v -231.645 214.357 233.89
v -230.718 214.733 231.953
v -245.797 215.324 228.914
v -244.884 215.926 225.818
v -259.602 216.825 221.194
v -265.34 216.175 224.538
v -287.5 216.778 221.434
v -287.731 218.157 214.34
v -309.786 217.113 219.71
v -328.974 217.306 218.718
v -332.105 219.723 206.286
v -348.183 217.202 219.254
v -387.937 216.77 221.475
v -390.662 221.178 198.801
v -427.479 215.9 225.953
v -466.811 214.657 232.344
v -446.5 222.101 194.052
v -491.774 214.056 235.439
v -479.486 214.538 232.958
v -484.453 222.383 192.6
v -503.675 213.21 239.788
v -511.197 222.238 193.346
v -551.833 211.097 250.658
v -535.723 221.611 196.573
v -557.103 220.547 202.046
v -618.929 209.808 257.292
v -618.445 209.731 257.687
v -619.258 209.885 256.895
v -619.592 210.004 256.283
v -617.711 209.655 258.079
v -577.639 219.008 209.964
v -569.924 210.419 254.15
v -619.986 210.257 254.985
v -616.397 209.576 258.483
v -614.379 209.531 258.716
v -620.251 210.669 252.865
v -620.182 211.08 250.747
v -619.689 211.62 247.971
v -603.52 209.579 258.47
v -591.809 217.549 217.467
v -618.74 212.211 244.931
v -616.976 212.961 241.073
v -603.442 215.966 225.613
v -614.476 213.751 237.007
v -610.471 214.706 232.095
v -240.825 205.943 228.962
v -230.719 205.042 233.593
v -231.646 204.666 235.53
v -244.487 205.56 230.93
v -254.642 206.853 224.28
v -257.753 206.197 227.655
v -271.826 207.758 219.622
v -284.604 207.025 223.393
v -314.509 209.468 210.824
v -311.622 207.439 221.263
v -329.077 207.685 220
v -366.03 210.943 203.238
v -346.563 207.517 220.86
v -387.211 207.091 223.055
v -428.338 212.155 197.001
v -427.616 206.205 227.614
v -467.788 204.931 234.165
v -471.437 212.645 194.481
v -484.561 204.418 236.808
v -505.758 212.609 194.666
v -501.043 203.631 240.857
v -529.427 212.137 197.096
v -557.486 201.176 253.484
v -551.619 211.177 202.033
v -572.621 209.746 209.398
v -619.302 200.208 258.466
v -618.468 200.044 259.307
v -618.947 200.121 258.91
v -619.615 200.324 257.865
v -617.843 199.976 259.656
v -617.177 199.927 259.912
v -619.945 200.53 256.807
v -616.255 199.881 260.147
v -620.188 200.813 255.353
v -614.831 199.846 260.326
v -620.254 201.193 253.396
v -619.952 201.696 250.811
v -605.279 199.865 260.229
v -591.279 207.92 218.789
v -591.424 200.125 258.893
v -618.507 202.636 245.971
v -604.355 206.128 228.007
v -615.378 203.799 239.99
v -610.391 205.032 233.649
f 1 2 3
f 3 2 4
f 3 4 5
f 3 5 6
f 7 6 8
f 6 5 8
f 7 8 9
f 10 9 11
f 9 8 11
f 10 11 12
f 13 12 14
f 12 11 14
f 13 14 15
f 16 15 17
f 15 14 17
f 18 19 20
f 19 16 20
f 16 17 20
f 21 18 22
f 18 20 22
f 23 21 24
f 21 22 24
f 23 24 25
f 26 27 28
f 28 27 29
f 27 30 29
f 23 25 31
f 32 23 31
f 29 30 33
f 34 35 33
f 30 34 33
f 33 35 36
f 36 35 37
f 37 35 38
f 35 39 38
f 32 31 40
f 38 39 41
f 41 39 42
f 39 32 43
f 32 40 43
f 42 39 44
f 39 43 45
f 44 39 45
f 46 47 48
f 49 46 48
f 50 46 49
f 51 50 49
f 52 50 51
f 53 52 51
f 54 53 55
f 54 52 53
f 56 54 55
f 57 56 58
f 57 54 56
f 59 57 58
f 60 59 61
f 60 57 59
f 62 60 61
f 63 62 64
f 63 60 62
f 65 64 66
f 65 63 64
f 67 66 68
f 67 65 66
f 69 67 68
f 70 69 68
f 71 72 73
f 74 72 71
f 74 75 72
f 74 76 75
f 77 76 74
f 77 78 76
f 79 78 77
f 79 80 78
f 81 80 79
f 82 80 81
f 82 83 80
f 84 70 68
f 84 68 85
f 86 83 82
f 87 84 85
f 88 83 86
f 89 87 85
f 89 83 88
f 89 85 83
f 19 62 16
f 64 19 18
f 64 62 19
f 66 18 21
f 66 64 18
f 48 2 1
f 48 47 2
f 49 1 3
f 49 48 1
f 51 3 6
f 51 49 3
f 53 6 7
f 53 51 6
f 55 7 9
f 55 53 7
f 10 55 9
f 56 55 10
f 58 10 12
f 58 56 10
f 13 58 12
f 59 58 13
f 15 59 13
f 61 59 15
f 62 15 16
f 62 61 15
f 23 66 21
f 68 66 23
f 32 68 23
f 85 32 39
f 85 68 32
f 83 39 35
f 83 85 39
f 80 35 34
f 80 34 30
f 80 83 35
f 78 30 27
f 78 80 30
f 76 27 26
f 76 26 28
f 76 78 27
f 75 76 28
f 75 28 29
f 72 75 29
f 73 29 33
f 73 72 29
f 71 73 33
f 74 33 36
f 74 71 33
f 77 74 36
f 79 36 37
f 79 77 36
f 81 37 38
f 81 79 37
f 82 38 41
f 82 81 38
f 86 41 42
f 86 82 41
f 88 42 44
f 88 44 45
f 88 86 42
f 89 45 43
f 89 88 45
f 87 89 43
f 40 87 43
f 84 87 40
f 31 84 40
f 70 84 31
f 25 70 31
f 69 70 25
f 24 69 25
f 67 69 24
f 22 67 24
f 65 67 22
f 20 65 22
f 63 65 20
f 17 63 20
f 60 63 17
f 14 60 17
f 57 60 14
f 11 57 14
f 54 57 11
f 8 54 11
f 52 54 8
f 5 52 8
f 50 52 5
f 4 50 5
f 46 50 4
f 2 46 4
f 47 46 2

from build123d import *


with BuildPart() as part:
    # Szkic1 → Wyciągnięcie po profilach1 section 0
    with BuildSketch(Plane(origin=(0, 250.36091718, 48.665232477), x_dir=(1, 0, 0), z_dir=(0, -0.981627183, -0.190808995))):
        with BuildLine():
            Line((-230.718181465, 186.71807225), (-231.645319449, 188.691942525))
            add(Edge.make_bspline(
                [(-231.645319449, 188.691942525), (-233.174644141, 187.999953464), (-234.721783332, 187.364140241), (-237.841249221, 186.171939505), (-239.414020678, 185.616954481), (-244.164400083, 184.053112564), (-247.374501337, 183.146719317), (-253.851623397, 181.51342164), (-257.119855918, 180.780316602), (-263.657686797, 179.453922888), (-266.932791453, 178.860184209), (-276.773612098, 177.252991106), (-283.354734665, 176.412436258), (-296.548078516, 175.080330415), (-303.160298205, 174.588761507), (-309.785788347, 174.246119623)],
                knots=[0, 0, 0, 0, 0.0625, 0.0625, 0.125, 0.125, 0.25, 0.25, 0.375, 0.375, 0.5, 0.5, 0.75, 0.75, 1, 1, 1, 1], degree=3))
            add(Edge.make_bspline(
                [(-348.183016714, 173.781671183), (-328.964171571, 172.456994761), (-309.785788347, 174.246119623)],
                knots=[0, 0, 0, 1, 1, 1], degree=2))
            add(Edge.make_bspline(
                [(-348.183016714, 173.781671183), (-358.151666656, 174.022025786), (-368.096286676, 174.522537173), (-387.94418485, 175.971142244), (-397.847591779, 176.917841756), (-417.618208057, 179.203129122), (-427.484934044, 180.546950038), (-442.260684852, 182.826175434), (-447.183290441, 183.629033837), (-457.009652818, 185.314266402), (-461.914365461, 186.197158818), (-466.811292159, 187.117080937)],
                knots=[0, 0, 0, 0, 0.25, 0.25, 0.5, 0.5, 0.75, 0.75, 0.875, 0.875, 1, 1, 1, 1], degree=3))
            add(Edge.make_bspline(
                [(-503.67525068, 194.699844137), (-486.113087933, 186.628450015), (-466.811292159, 187.117080937)],
                knots=[0, 0, 0, 1, 1, 1], degree=2))
            add(Edge.make_bspline(
                [(-503.67525068, 194.699844137), (-514.886156137, 197.183158341), (-526.069069208, 199.799603445), (-542.843173548, 203.725532692), (-548.433789911, 205.045195718), (-556.847390253, 206.862217693), (-559.656198502, 207.441328721), (-565.285707455, 208.525652892), (-568.106893587, 209.027849652), (-573.758546812, 209.974572715), (-576.588548469, 210.421991156), (-582.255411466, 211.274203028), (-585.092466698, 211.677791635), (-590.775811551, 212.427587781), (-593.622461186, 212.771558242), (-597.902598645, 213.224362574), (-599.33093878, 213.36518339), (-602.190977957, 213.625953291), (-603.621807395, 213.74850469), (-605.769052097, 213.890532369), (-606.485034549, 213.930761383), (-607.917647629, 213.991533363), (-608.634307809, 214.011178807), (-610.068244724, 214.031744007), (-610.785502514, 214.03323918), (-612.220370634, 214.025522336), (-612.937904151, 214.018643253), (-614.373446848, 213.990438557), (-615.094405741, 213.959551393), (-616.154316733, 213.800587864), (-616.504425777, 213.729005846), (-617.19627763, 213.537146432), (-617.539907955, 213.417073554), (-618.025928813, 213.187044681), (-618.183588752, 213.101834107), (-618.487632655, 212.909275387), (-618.635214003, 212.800703818), (-618.905216661, 212.56311753), (-619.028373994, 212.433641543), (-619.248292015, 212.150880775), (-619.346463926, 211.996467784), (-619.602643649, 211.519652342), (-619.725174636, 211.184978082), (-619.922621807, 210.499055279), (-619.997357698, 210.146675653), (-620.122117308, 209.439404469), (-620.169952886, 209.083937157), (-620.236946265, 208.369390812), (-620.256057026, 208.009403538), (-620.272323599, 206.93673215), (-620.228983229, 206.228087719), (-620.060745622, 204.820536998), (-619.93589689, 204.121624917), (-619.624483911, 202.731169778), (-619.437495298, 202.038892606), (-618.800725774, 200.000887185), (-618.274140545, 198.683280498), (-617.06173932, 196.112125571), (-616.37402886, 194.854996442), (-614.892048313, 192.440246872), (-614.092796263, 191.278019838), (-612.383886198, 189.039120678), (-611.475247542, 187.961658639), (-610.045682759, 186.397079988), (-609.558049109, 185.884164636), (-608.562812036, 184.87380875), (-608.054261942, 184.375495234), (-606.510608451, 182.909046548), (-605.457949932, 181.968180201), (-602.246891056, 179.228432719), (-600.032107811, 177.517553058), (-595.480994707, 174.285501661), (-593.145169014, 172.763543035), (-588.374611336, 169.873997071), (-585.940036539, 168.506164399), (-580.983288597, 165.907221095), (-578.460054833, 164.67776586), (-574.613641656, 162.92966878), (-573.321179813, 162.362813896), (-570.72874085, 161.263307356), (-569.427344918, 160.729821284), (-565.508102562, 159.176672617), (-562.875139683, 158.204514072), (-557.57061981, 156.381480503), (-554.89911711, 155.530434856), (-549.519642901, 153.942948231), (-546.811580447, 153.206793044), (-542.719703975, 152.196153858), (-541.350718573, 151.875070349), (-538.602803254, 151.264154355), (-537.222650497, 150.973945298), (-533.07763064, 150.149751095), (-530.312072996, 149.661683583), (-524.776746306, 148.802487292), (-522.006930458, 148.432658084), (-516.462903089, 147.81505516), (-513.688733399, 147.566119904), (-505.360707441, 146.972502593), (-499.801157696, 146.785912361), (-488.675496216, 146.594939917), (-483.108917997, 146.60351064), (-471.96845567, 146.823516049), (-466.394878068, 147.026439938), (-455.243137073, 147.559622222), (-449.662553722, 147.891994248), (-438.516776064, 148.643989656), (-432.94937268, 149.06163809), (-421.823476404, 149.964591923), (-416.26507807, 150.450615294), (-405.155380964, 151.476568692), (-399.604088693, 152.016548071), (-382.963513349, 153.73748367), (-371.887469562, 155.018965175), (-355.303574737, 157.170273359), (-349.780935591, 157.927814607), (-338.747461606, 159.532526677), (-333.236280066, 160.377065009), (-322.22686618, 162.164464305), (-316.728864243, 163.109074761), (-305.747305667, 165.107978159), (-300.263728509, 166.162115302), (-292.052072184, 167.847415948), (-289.317157844, 168.426680304), (-283.852570751, 169.625008143), (-281.12178784, 170.244451213), (-272.949727013, 172.169989218), (-267.527009062, 173.540386835), (-259.449271288, 175.788890801), (-256.766293113, 176.571266618), (-251.42592644, 178.223638349), (-248.768221826, 179.092551866), (-244.808978612, 180.489445382), (-243.493864392, 180.970941908), (-240.874964635, 181.972724826), (-239.570510548, 182.493630845), (-236.985358252, 183.58161694), (-235.702414065, 184.146108379), (-233.174982125, 185.356932848), (-231.93081956, 186.003957932), (-230.718181465, 186.71807225)],
                knots=[0, 0, 0, 0, 0.0625, 0.0625, 0.09375, 0.09375, 0.109375, 0.109375, 0.125, 0.125, 0.140625, 0.140625, 0.15625, 0.15625, 0.171875, 0.171875, 0.1796875, 0.1796875, 0.1875, 0.1875, 0.19140625, 0.19140625, 0.1953125, 0.1953125, 0.19921875, 0.19921875, 0.203125, 0.203125, 0.20703125, 0.20703125, 0.208984375, 0.208984375, 0.2109375, 0.2109375, 0.211914062, 0.211914062, 0.212890625, 0.212890625, 0.213867187, 0.213867187, 0.21484375, 0.21484375, 0.216796875, 0.216796875, 0.21875, 0.21875, 0.220703125, 0.220703125, 0.22265625, 0.22265625, 0.2265625, 0.2265625, 0.23046875, 0.23046875, 0.234375, 0.234375, 0.2421875, 0.2421875, 0.25, 0.25, 0.2578125, 0.2578125, 0.265625, 0.265625, 0.26953125, 0.26953125, 0.2734375, 0.2734375, 0.28125, 0.28125, 0.296875, 0.296875, 0.3125, 0.3125, 0.328125, 0.328125, 0.34375, 0.34375, 0.3515625, 0.3515625, 0.359375, 0.359375, 0.375, 0.375, 0.390625, 0.390625, 0.40625, 0.40625, 0.4140625, 0.4140625, 0.421875, 0.421875, 0.4375, 0.4375, 0.453125, 0.453125, 0.46875, 0.46875, 0.5, 0.5, 0.53125, 0.53125, 0.5625, 0.5625, 0.59375, 0.59375, 0.625, 0.625, 0.65625, 0.65625, 0.6875, 0.6875, 0.75, 0.75, 0.78125, 0.78125, 0.8125, 0.8125, 0.84375, 0.84375, 0.875, 0.875, 0.890625, 0.890625, 0.90625, 0.90625, 0.9375, 0.9375, 0.953125, 0.953125, 0.96875, 0.96875, 0.9765625, 0.9765625, 0.984375, 0.984375, 0.9921875, 0.9921875, 1, 1, 1, 1], degree=3))
        make_face()
    # Szkic2 → Wyciągnięcie po profilach1 section 1
    with BuildSketch(Plane(origin=(0, 241.329947092, 46.90978972), x_dir=(1, 0, 0), z_dir=(0, 0.981627183, 0.190808995))):
        with BuildLine():
            Line((-231.646212924, -192.150787371), (-230.719075123, -190.177260074))
            add(Edge.make_bspline(
                [(-230.719075123, -190.177260074), (-231.948901198, -189.453147906), (-233.20887904, -188.799403111), (-235.755254104, -187.582025717), (-237.043499625, -187.016387422), (-240.930581019, -185.383355833), (-243.555608344, -184.390843227), (-248.847871126, -182.52648997), (-251.515431557, -181.655578415), (-256.880143927, -179.998356663), (-259.577649206, -179.213056657), (-264.995498516, -177.707752045), (-267.716935541, -176.987652686), (-273.173189749, -175.60008308), (-275.90549341, -174.933883516), (-284.112891469, -173.004549654), (-289.598440536, -171.810466147), (-300.590412603, -169.560166875), (-306.096893758, -168.504335203), (-317.126413334, -166.502028969), (-322.649511073, -165.555946181), (-339.241976719, -162.87074662), (-350.332670964, -161.272485615), (-372.563252551, -158.400873194), (-383.701752049, -157.11835537), (-400.440188062, -155.397257975), (-406.024765373, -154.857234239), (-417.202083272, -153.831103416), (-422.796533028, -153.345581305), (-433.986186707, -152.44597855), (-439.581401193, -152.030775931), (-450.77280575, -151.287445217), (-456.369020983, -150.961562741), (-467.56296205, -150.444624481), (-473.160663276, -150.251372161), (-484.358234817, -150.058466439), (-489.958194001, -150.066744834), (-501.160441068, -150.291146194), (-506.762696657, -150.504386826), (-515.169825975, -151.158585683), (-517.972805094, -151.430443194), (-523.580181633, -152.100746661), (-526.387775415, -152.499530907), (-534.74074073, -153.866708494), (-540.240829662, -155.003321589), (-548.374919876, -157.089374494), (-551.067687575, -157.845801363), (-556.418550136, -159.472534871), (-559.076397943, -160.343652941), (-564.354873991, -162.208133352), (-566.975486778, -163.201546453), (-572.177838401, -165.3160506), (-574.759951718, -166.435911696), (-579.879028517, -168.823924411), (-582.421458486, -170.096690144), (-587.399982445, -172.780552185), (-589.842302197, -174.192094015), (-597.006211419, -178.668507031), (-601.567430201, -181.97119253), (-606.86619118, -186.696807469), (-607.907306115, -187.674953253), (-609.906600664, -189.689607526), (-610.867466168, -190.728126276), (-612.692971166, -192.882556951), (-613.557169123, -193.998824), (-614.767234871, -195.74257906), (-615.156519044, -196.335147907), (-615.906188642, -197.543528445), (-616.267154497, -198.16035143), (-617.301224195, -200.040237034), (-617.918858094, -201.321366231), (-618.975723877, -203.952930941), (-619.415386547, -205.303199099), (-619.901035927, -207.396137179), (-620.033628179, -208.103829749), (-620.216014742, -209.518810025), (-620.291835155, -210.58421703), (-620.247970749, -211.657813386), (-620.189568984, -212.375539464), (-620.145782556, -212.734004312), (-620.029737618, -213.442239209), (-619.959696192, -213.793681415), (-619.821977141, -214.313575775), (-619.770256163, -214.485579644), (-619.649925655, -214.82582824), (-619.580724196, -214.995255164), (-619.421796717, -215.320531679), (-619.332121654, -215.476717239), (-619.125867399, -215.772087212), (-619.007079731, -215.912200799), (-618.614803353, -216.291802882), (-618.312542654, -216.492025046), (-617.663313635, -216.822106069), (-617.325971244, -216.94742188), (-616.636386212, -217.151548677), (-616.282981523, -217.229675381), (-615.209916887, -217.404292633), (-614.486665384, -217.439932408), (-613.401279794, -217.46385096), (-613.039751167, -217.468018286), (-612.316665207, -217.476762746), (-611.955184164, -217.480250774), (-610.148242152, -217.491078281), (-608.704263711, -217.477253344), (-605.822771219, -217.357318588), (-604.384829895, -217.257308462), (-601.511437363, -217.0217396), (-600.075759723, -216.889413383), (-597.205655435, -216.606901928), (-595.771336145, -216.455184064), (-591.470516624, -215.969503622), (-588.605394881, -215.604293633), (-582.887207402, -214.820011263), (-580.032906206, -214.401642781), (-574.332562265, -213.519711277), (-571.486095774, -213.058467216), (-565.80456902, -212.073558268), (-562.970172606, -211.546260463), (-557.315094211, -210.416612326), (-554.493828971, -209.817453892), (-548.859970661, -208.571678404), (-546.047324243, -207.925353296), (-540.424831829, -206.617377706), (-537.614741724, -205.957579388), (-523.561857343, -202.670887625), (-512.317333578, -200.052078006), (-501.042625967, -197.576867128)],
                knots=[0, 0, 0, 0, 0.0078125, 0.0078125, 0.015625, 0.015625, 0.03125, 0.03125, 0.046875, 0.046875, 0.0625, 0.0625, 0.078125, 0.078125, 0.09375, 0.09375, 0.125, 0.125, 0.15625, 0.15625, 0.1875, 0.1875, 0.25, 0.25, 0.3125, 0.3125, 0.34375, 0.34375, 0.375, 0.375, 0.40625, 0.40625, 0.4375, 0.4375, 0.46875, 0.46875, 0.5, 0.5, 0.53125, 0.53125, 0.546875, 0.546875, 0.5625, 0.5625, 0.59375, 0.59375, 0.609375, 0.609375, 0.625, 0.625, 0.640625, 0.640625, 0.65625, 0.65625, 0.671875, 0.671875, 0.6875, 0.6875, 0.71875, 0.71875, 0.7265625, 0.7265625, 0.734375, 0.734375, 0.7421875, 0.7421875, 0.74609375, 0.74609375, 0.75, 0.75, 0.7578125, 0.7578125, 0.765625, 0.765625, 0.76953125, 0.76953125, 0.7734375, 0.775390625, 0.775390625, 0.77734375, 0.77734375, 0.779296875, 0.779296875, 0.780273437, 0.780273437, 0.78125, 0.78125, 0.782226562, 0.782226562, 0.783203125, 0.783203125, 0.78515625, 0.78515625, 0.787109375, 0.787109375, 0.7890625, 0.7890625, 0.79296875, 0.79296875, 0.794921875, 0.794921875, 0.796875, 0.796875, 0.8046875, 0.8046875, 0.8125, 0.8125, 0.8203125, 0.8203125, 0.828125, 0.828125, 0.84375, 0.84375, 0.859375, 0.859375, 0.875, 0.875, 0.890625, 0.890625, 0.90625, 0.90625, 0.921875, 0.921875, 0.9375, 0.9375, 1, 1, 1, 1], degree=3))
            add(Edge.make_bspline(
                [(-501.042625967, -197.576867128), (-484.70639457, -192.735609928), (-467.788308948, -190.760045533)],
                knots=[0, 0, 0, 1, 1, 1], degree=2))
            add(Edge.make_bspline(
                [(-467.788308948, -190.760045533), (-462.786676869, -189.815443547), (-457.776990743, -188.909158453), (-447.739980306, -187.180501396), (-442.71289445, -186.357785178), (-427.622254664, -184.024069495), (-417.54302444, -182.650776587), (-397.341308596, -180.324047944), (-387.219395985, -179.365050328), (-372.000474202, -178.276499945), (-366.921451485, -177.972362208), (-356.750298544, -177.491314356), (-351.654106922, -177.314334211), (-346.563485915, -177.206095001)],
                knots=[0, 0, 0, 0, 0.125, 0.125, 0.25, 0.25, 0.5, 0.5, 0.75, 0.75, 0.875, 0.875, 1, 1, 1, 1], degree=3))
            add(Edge.make_bspline(
                [(-346.563485915, -177.206095001), (-329.06213864, -175.248845373), (-311.621831541, -177.616174998)],
                knots=[0, 0, 0, 1, 1, 1], degree=2))
            add(Edge.make_bspline(
                [(-311.621831541, -177.616174998), (-304.850539253, -177.938142667), (-298.091025125, -178.413813258), (-284.599556619, -179.724804329), (-277.867583166, -180.559875897), (-267.797000058, -182.169749214), (-264.444739267, -182.766406042), (-259.424595361, -183.76901685), (-257.752603343, -184.121350362), (-254.41170897, -184.866336955), (-252.743343717, -185.258479423), (-247.763643812, -186.499890794), (-244.473002096, -187.419099547), (-239.604690543, -189.01043981), (-237.993069173, -189.57591185), (-234.797111805, -190.792573508), (-233.212305749, -191.44228643), (-231.646212924, -192.150787371)],
                knots=[0, 0, 0, 0, 0.25, 0.25, 0.5, 0.5, 0.625, 0.625, 0.6875, 0.6875, 0.75, 0.75, 0.875, 0.875, 0.9375, 0.9375, 1, 1, 1, 1], degree=3))
        make_face()
    loft()


solid = part.part
